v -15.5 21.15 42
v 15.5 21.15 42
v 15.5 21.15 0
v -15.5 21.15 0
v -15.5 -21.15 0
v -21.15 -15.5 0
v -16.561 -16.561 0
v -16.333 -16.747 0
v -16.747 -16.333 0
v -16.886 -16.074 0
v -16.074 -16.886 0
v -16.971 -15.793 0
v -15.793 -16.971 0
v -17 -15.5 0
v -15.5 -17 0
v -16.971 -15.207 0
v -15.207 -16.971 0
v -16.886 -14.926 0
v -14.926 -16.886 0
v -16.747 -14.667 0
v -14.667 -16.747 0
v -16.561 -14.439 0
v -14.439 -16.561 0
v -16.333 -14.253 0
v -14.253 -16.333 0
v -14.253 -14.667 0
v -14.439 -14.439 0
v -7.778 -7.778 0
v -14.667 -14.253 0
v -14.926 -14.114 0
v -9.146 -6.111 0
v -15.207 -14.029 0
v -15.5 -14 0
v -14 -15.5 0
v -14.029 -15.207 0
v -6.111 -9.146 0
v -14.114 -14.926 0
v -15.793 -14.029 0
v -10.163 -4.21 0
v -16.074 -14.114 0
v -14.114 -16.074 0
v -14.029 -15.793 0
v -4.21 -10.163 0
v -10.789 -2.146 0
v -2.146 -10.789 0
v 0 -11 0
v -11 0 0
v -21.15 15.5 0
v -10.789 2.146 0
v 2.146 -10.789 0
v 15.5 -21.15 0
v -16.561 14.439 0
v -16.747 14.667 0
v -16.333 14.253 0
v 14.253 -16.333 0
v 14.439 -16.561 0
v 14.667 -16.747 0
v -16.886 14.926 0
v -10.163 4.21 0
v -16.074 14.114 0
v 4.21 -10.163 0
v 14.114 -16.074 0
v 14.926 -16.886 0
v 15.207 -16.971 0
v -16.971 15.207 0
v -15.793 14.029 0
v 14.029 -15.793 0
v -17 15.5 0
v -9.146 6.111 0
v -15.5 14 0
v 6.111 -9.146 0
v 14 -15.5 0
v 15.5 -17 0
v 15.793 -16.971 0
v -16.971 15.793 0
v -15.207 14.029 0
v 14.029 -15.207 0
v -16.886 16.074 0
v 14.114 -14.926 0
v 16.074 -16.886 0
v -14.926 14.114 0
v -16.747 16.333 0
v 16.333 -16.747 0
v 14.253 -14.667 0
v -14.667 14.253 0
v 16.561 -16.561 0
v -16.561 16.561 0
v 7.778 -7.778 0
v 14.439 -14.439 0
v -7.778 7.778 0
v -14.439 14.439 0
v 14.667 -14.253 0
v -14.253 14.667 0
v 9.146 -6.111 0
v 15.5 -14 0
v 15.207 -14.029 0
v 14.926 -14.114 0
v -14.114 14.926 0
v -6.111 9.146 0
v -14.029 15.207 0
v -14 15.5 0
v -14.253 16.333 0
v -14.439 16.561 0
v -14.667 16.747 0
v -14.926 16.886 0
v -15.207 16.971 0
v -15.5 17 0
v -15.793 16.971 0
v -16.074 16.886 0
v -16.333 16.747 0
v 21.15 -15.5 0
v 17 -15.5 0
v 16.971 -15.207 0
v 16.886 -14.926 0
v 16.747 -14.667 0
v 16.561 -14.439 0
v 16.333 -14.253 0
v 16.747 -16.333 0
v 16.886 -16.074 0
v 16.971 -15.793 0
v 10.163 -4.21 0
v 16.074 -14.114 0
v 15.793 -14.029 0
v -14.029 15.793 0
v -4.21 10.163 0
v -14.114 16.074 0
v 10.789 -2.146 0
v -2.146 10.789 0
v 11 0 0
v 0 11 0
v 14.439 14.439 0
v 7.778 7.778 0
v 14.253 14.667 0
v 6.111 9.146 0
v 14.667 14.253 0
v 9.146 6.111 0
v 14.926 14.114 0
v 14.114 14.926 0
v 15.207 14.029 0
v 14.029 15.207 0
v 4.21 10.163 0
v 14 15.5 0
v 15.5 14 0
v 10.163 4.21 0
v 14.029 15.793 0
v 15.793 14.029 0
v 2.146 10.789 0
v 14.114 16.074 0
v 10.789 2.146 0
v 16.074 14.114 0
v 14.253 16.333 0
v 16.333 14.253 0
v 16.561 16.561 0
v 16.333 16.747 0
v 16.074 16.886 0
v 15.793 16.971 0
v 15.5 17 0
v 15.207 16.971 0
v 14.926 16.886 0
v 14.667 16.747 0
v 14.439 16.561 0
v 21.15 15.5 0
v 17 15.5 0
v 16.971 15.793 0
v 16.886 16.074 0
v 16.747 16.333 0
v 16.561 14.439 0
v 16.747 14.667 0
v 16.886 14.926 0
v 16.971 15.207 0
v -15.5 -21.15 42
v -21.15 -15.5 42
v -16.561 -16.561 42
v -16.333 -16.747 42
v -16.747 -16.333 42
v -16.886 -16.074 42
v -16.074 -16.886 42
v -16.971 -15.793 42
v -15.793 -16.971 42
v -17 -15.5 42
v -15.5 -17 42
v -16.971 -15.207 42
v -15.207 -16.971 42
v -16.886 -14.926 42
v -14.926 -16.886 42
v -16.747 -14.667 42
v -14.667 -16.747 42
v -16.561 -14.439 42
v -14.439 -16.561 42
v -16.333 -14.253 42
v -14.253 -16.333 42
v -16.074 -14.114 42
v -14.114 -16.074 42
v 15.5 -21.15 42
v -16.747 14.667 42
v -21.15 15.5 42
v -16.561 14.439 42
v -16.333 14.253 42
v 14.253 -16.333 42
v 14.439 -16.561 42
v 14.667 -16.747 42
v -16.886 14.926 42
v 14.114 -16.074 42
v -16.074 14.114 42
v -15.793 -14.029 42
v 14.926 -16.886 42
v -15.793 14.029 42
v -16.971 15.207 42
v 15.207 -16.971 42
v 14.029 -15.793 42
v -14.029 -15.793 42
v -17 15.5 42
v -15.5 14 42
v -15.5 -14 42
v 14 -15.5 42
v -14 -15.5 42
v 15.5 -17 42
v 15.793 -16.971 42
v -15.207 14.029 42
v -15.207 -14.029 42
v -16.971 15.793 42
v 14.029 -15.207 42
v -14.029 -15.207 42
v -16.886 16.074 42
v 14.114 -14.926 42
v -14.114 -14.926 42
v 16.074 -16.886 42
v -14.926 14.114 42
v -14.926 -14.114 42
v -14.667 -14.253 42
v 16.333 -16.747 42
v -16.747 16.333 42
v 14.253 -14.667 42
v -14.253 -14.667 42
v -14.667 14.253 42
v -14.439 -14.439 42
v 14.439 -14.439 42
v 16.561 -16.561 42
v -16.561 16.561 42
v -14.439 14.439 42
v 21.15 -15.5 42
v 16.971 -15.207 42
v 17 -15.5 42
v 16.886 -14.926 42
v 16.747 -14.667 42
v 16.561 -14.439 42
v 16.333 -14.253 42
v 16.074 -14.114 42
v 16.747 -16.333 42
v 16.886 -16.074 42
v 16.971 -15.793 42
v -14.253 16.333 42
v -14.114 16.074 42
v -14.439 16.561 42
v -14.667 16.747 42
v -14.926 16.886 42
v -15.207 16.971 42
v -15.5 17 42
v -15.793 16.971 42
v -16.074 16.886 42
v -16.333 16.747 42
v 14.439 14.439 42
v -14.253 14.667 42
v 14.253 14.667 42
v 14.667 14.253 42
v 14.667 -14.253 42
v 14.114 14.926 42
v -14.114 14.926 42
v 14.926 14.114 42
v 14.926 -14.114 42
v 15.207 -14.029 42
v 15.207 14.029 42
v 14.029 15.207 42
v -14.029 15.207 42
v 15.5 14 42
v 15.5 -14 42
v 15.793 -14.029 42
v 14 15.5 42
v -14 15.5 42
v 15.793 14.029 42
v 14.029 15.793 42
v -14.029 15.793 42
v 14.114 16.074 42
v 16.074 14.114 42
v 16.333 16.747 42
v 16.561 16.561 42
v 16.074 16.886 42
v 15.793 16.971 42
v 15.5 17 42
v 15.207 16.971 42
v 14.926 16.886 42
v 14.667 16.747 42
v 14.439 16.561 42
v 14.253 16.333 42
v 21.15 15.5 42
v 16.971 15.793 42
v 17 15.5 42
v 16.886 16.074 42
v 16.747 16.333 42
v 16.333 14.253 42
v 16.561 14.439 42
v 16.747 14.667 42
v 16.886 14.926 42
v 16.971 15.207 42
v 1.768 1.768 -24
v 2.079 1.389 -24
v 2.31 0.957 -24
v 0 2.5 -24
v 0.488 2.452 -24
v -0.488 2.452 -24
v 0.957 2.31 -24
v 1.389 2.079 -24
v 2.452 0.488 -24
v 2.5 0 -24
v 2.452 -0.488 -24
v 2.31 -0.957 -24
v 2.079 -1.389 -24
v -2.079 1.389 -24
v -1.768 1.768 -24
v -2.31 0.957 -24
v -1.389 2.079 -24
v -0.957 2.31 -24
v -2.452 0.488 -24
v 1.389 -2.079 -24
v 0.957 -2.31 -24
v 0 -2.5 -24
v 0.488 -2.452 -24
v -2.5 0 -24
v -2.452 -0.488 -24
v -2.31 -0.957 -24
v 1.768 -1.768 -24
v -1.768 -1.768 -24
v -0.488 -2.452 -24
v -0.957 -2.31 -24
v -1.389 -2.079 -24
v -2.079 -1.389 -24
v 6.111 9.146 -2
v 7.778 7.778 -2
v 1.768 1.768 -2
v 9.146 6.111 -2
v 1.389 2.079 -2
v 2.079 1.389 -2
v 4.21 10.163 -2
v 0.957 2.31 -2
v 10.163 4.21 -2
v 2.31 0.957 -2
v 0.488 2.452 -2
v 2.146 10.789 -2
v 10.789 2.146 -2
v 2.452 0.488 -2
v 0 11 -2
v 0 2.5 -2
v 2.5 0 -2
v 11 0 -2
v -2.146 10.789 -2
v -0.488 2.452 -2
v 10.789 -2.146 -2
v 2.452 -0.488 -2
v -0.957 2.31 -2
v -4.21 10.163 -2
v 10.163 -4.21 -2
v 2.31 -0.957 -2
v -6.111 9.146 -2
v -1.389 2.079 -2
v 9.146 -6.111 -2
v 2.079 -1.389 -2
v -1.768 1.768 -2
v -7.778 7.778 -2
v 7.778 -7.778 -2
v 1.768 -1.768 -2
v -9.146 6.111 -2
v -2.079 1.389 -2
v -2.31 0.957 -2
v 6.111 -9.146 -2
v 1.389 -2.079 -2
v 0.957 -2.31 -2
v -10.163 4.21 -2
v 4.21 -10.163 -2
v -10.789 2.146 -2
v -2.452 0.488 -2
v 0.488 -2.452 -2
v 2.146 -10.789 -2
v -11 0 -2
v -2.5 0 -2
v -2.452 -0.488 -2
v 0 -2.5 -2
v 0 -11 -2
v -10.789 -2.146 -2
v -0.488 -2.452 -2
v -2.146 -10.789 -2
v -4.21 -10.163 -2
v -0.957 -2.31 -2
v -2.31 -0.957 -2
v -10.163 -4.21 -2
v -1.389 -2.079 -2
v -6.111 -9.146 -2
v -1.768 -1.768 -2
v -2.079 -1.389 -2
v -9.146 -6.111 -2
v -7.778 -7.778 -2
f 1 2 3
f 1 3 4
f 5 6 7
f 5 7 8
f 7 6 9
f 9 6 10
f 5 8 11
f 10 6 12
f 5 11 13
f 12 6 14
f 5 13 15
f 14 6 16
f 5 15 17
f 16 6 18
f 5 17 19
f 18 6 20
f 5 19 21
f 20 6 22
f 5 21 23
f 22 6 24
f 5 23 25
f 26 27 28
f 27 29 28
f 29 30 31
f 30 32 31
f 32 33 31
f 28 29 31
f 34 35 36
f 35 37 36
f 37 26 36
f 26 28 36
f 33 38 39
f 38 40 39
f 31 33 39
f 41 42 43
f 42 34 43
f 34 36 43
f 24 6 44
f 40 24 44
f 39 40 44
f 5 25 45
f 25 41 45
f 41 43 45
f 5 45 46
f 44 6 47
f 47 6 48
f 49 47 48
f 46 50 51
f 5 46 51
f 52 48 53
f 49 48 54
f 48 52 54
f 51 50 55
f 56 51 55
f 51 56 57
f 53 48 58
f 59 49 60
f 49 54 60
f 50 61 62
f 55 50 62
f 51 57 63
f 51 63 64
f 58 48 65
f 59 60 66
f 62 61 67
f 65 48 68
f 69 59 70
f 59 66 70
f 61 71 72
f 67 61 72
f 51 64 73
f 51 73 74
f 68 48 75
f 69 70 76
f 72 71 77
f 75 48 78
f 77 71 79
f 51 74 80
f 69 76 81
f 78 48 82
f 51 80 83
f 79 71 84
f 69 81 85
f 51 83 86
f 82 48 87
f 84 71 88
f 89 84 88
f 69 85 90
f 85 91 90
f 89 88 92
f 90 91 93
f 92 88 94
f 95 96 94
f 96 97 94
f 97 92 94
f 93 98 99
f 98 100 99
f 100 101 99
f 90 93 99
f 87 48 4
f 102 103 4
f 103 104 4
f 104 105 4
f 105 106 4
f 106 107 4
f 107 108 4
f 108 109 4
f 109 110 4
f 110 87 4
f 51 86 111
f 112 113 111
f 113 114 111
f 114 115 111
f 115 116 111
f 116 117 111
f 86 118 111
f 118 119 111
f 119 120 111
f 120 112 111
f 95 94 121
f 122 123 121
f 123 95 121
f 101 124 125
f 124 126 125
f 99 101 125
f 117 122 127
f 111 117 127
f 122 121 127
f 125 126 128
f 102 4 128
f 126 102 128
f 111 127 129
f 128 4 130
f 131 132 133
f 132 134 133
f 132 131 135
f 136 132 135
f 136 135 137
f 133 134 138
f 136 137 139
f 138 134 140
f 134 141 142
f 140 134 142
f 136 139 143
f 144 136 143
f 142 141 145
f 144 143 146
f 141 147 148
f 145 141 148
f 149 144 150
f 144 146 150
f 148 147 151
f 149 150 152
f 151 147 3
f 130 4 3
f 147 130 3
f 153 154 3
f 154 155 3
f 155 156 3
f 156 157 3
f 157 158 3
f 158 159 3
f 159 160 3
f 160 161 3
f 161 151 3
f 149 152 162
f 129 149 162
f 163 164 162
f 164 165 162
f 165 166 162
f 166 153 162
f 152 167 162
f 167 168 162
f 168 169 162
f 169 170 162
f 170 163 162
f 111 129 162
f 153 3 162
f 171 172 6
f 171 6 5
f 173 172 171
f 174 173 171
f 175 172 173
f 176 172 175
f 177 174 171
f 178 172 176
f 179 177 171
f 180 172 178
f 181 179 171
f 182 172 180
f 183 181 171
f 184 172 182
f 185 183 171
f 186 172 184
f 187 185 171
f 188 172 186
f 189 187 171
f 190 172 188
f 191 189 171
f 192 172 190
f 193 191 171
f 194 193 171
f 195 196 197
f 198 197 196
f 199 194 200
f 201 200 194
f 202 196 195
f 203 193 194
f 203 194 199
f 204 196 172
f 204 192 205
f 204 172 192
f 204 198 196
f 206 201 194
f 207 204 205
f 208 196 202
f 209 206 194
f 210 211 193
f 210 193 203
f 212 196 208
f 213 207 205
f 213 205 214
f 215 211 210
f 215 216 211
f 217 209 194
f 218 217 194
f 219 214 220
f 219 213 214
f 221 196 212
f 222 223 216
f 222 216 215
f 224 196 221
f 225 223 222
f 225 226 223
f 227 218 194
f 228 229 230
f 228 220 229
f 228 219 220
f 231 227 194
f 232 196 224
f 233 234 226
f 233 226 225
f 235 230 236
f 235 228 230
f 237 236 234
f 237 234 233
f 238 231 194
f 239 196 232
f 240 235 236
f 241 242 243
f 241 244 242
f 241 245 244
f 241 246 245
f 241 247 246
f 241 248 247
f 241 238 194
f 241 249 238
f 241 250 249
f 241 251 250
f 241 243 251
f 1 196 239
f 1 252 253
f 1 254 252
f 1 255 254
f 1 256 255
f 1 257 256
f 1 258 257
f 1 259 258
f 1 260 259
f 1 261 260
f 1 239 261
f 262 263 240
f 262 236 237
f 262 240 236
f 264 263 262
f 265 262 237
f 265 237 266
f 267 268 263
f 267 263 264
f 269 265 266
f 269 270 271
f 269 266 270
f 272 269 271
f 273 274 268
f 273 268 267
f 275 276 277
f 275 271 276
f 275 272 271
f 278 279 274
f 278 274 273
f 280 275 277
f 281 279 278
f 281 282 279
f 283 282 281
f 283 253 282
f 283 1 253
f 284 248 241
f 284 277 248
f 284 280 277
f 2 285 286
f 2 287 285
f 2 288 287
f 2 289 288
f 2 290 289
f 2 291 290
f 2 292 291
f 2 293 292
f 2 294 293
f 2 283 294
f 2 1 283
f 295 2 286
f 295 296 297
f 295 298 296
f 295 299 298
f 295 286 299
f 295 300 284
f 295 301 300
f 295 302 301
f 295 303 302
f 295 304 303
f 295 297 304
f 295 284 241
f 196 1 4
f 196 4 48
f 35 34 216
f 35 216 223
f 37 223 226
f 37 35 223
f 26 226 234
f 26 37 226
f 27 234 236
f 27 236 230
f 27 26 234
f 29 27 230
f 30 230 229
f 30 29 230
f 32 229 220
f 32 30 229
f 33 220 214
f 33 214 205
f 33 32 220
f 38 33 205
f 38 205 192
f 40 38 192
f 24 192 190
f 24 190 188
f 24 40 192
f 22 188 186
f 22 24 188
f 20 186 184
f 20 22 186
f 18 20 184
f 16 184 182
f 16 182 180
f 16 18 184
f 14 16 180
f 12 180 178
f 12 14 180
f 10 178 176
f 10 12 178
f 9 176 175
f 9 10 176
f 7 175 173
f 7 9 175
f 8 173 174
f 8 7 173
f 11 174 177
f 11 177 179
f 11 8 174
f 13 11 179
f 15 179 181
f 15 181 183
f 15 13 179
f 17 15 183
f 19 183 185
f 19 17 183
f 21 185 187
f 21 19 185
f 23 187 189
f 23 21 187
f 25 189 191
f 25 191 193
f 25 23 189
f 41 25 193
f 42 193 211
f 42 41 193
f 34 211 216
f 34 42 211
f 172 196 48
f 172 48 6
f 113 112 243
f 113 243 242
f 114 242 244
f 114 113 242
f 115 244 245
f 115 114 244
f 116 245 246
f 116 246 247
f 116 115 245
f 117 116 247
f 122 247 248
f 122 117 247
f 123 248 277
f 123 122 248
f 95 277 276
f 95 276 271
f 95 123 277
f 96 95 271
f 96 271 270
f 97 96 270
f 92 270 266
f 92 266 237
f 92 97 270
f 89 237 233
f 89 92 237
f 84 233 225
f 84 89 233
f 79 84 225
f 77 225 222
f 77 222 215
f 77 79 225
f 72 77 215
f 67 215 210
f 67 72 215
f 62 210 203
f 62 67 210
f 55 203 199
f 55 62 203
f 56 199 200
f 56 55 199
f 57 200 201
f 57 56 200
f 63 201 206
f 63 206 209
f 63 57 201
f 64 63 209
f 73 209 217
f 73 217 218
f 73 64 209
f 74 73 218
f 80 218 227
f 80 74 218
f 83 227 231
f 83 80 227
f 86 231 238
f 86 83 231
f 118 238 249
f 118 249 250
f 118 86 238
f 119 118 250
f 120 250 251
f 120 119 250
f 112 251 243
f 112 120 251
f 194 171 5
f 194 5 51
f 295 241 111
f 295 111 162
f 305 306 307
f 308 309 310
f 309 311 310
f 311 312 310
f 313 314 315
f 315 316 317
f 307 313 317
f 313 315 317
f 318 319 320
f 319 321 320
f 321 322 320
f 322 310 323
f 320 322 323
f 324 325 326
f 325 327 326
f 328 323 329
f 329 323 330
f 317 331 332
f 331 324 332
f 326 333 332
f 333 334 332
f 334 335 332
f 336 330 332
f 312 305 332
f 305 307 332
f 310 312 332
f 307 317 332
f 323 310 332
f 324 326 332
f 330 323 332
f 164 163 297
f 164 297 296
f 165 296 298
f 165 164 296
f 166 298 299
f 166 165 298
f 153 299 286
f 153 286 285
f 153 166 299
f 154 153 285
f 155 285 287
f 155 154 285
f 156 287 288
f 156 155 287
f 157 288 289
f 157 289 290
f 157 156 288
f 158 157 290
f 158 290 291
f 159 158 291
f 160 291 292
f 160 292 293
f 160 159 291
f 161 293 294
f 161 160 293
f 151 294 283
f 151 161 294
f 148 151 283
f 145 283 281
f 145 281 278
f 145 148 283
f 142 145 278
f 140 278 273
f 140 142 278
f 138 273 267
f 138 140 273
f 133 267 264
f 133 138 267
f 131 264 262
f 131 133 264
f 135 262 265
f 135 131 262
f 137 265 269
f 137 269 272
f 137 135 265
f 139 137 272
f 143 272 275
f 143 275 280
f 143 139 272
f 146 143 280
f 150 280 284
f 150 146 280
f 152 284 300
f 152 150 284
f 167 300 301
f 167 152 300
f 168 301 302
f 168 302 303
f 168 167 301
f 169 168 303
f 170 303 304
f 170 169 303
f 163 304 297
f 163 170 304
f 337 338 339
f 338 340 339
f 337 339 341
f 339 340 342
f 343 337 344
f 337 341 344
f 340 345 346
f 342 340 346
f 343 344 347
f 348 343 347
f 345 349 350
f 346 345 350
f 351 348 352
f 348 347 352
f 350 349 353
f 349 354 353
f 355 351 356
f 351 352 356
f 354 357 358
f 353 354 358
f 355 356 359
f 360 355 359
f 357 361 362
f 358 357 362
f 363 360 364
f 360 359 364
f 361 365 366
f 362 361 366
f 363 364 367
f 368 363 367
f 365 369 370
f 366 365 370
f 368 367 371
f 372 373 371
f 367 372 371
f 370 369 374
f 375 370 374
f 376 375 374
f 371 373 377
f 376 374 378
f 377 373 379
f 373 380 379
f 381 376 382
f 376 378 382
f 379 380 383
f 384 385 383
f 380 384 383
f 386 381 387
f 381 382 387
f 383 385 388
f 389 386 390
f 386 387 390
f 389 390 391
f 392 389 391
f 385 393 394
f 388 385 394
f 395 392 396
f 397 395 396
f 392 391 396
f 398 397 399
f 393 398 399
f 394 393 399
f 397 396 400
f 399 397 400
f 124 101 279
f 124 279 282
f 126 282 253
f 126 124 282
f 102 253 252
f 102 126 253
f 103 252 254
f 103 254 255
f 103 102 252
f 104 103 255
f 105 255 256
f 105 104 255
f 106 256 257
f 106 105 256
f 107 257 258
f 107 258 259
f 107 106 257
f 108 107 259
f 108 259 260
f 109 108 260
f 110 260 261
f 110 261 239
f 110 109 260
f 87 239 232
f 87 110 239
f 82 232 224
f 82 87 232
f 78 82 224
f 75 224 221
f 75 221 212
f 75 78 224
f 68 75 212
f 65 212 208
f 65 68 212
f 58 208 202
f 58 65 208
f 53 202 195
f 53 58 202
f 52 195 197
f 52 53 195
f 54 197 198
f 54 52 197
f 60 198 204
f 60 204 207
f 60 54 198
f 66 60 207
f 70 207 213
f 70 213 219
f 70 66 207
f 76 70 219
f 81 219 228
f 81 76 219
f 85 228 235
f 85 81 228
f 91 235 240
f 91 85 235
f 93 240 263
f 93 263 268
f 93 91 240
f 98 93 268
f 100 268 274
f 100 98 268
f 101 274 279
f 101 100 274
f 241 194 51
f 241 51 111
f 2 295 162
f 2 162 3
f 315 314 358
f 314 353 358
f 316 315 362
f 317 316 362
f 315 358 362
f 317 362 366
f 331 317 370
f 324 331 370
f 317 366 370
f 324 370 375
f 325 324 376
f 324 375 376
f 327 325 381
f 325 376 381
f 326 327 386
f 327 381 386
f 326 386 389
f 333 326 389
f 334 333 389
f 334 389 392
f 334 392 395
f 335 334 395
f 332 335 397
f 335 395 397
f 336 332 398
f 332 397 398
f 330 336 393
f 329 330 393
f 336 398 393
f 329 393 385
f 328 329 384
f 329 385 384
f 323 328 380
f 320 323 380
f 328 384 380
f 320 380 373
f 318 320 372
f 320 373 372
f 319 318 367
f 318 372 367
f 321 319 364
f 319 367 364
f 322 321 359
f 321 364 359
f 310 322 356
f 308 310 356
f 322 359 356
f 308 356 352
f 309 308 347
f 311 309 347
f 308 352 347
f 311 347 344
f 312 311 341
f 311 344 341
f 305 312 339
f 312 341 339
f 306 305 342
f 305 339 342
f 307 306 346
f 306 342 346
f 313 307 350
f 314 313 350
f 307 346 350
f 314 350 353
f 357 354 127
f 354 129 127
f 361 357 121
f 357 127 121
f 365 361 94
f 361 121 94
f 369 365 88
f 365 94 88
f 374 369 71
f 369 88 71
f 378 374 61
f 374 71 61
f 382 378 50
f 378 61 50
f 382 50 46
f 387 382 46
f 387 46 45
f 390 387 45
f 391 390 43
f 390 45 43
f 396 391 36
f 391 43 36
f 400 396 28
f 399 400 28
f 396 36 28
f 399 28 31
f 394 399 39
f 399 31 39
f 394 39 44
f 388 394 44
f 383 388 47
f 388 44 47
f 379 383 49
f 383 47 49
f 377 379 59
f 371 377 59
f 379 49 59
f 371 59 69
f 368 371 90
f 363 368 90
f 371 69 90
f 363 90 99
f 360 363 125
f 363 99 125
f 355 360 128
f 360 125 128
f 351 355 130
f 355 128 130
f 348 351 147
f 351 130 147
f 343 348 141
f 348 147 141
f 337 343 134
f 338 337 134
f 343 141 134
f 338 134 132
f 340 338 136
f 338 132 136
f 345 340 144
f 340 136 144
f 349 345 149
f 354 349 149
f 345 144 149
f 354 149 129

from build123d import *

# Parameters (mm, degrees)
SKETCH1_R           = 1.5
BOSS_EXTRUDE1_DEPTH = 42


with BuildPart() as part:
    # Sketch1 → Boss-Extrude1 (new body)
    with BuildSketch(Plane.XY):
        Polygon((-15.5, 21.15), (-21.15, 15.5), (-21.15, -15.5), (-15.5, -21.15), (15.5, -21.15), (21.15, -15.5), (21.15, 15.5), (15.5, 21.15), align=None)
        with Locations((15.5, 15.5)):
            Circle(SKETCH1_R, mode=Mode.SUBTRACT)
        with Locations((15.5, -15.5)):
            Circle(SKETCH1_R, mode=Mode.SUBTRACT)
        with Locations((-15.5, -15.5)):
            Circle(SKETCH1_R, mode=Mode.SUBTRACT)
        with Locations((-15.5, 15.5)):
            Circle(SKETCH1_R, mode=Mode.SUBTRACT)
    extrude(amount=BOSS_EXTRUDE1_DEPTH)

    # Sketch3 → Revolve1 (revolve)
    with BuildSketch(Plane(origin=(0, 0, 0), x_dir=(0, 0, -1), z_dir=(1, 0, 0)), mode=Mode.PRIVATE) as revolve1_sk:
        Polygon((0, 0), (24, 0), (24, 2.5), (2, 2.5), (2, 11), (0, 11), align=None)
    revolve(revolve1_sk.sketch.rotate(Axis((0, 0, 0), (0, 0, -1)), 90), axis=Axis((0, 0, 0), (0, 0, -1)))


solid = part.part
